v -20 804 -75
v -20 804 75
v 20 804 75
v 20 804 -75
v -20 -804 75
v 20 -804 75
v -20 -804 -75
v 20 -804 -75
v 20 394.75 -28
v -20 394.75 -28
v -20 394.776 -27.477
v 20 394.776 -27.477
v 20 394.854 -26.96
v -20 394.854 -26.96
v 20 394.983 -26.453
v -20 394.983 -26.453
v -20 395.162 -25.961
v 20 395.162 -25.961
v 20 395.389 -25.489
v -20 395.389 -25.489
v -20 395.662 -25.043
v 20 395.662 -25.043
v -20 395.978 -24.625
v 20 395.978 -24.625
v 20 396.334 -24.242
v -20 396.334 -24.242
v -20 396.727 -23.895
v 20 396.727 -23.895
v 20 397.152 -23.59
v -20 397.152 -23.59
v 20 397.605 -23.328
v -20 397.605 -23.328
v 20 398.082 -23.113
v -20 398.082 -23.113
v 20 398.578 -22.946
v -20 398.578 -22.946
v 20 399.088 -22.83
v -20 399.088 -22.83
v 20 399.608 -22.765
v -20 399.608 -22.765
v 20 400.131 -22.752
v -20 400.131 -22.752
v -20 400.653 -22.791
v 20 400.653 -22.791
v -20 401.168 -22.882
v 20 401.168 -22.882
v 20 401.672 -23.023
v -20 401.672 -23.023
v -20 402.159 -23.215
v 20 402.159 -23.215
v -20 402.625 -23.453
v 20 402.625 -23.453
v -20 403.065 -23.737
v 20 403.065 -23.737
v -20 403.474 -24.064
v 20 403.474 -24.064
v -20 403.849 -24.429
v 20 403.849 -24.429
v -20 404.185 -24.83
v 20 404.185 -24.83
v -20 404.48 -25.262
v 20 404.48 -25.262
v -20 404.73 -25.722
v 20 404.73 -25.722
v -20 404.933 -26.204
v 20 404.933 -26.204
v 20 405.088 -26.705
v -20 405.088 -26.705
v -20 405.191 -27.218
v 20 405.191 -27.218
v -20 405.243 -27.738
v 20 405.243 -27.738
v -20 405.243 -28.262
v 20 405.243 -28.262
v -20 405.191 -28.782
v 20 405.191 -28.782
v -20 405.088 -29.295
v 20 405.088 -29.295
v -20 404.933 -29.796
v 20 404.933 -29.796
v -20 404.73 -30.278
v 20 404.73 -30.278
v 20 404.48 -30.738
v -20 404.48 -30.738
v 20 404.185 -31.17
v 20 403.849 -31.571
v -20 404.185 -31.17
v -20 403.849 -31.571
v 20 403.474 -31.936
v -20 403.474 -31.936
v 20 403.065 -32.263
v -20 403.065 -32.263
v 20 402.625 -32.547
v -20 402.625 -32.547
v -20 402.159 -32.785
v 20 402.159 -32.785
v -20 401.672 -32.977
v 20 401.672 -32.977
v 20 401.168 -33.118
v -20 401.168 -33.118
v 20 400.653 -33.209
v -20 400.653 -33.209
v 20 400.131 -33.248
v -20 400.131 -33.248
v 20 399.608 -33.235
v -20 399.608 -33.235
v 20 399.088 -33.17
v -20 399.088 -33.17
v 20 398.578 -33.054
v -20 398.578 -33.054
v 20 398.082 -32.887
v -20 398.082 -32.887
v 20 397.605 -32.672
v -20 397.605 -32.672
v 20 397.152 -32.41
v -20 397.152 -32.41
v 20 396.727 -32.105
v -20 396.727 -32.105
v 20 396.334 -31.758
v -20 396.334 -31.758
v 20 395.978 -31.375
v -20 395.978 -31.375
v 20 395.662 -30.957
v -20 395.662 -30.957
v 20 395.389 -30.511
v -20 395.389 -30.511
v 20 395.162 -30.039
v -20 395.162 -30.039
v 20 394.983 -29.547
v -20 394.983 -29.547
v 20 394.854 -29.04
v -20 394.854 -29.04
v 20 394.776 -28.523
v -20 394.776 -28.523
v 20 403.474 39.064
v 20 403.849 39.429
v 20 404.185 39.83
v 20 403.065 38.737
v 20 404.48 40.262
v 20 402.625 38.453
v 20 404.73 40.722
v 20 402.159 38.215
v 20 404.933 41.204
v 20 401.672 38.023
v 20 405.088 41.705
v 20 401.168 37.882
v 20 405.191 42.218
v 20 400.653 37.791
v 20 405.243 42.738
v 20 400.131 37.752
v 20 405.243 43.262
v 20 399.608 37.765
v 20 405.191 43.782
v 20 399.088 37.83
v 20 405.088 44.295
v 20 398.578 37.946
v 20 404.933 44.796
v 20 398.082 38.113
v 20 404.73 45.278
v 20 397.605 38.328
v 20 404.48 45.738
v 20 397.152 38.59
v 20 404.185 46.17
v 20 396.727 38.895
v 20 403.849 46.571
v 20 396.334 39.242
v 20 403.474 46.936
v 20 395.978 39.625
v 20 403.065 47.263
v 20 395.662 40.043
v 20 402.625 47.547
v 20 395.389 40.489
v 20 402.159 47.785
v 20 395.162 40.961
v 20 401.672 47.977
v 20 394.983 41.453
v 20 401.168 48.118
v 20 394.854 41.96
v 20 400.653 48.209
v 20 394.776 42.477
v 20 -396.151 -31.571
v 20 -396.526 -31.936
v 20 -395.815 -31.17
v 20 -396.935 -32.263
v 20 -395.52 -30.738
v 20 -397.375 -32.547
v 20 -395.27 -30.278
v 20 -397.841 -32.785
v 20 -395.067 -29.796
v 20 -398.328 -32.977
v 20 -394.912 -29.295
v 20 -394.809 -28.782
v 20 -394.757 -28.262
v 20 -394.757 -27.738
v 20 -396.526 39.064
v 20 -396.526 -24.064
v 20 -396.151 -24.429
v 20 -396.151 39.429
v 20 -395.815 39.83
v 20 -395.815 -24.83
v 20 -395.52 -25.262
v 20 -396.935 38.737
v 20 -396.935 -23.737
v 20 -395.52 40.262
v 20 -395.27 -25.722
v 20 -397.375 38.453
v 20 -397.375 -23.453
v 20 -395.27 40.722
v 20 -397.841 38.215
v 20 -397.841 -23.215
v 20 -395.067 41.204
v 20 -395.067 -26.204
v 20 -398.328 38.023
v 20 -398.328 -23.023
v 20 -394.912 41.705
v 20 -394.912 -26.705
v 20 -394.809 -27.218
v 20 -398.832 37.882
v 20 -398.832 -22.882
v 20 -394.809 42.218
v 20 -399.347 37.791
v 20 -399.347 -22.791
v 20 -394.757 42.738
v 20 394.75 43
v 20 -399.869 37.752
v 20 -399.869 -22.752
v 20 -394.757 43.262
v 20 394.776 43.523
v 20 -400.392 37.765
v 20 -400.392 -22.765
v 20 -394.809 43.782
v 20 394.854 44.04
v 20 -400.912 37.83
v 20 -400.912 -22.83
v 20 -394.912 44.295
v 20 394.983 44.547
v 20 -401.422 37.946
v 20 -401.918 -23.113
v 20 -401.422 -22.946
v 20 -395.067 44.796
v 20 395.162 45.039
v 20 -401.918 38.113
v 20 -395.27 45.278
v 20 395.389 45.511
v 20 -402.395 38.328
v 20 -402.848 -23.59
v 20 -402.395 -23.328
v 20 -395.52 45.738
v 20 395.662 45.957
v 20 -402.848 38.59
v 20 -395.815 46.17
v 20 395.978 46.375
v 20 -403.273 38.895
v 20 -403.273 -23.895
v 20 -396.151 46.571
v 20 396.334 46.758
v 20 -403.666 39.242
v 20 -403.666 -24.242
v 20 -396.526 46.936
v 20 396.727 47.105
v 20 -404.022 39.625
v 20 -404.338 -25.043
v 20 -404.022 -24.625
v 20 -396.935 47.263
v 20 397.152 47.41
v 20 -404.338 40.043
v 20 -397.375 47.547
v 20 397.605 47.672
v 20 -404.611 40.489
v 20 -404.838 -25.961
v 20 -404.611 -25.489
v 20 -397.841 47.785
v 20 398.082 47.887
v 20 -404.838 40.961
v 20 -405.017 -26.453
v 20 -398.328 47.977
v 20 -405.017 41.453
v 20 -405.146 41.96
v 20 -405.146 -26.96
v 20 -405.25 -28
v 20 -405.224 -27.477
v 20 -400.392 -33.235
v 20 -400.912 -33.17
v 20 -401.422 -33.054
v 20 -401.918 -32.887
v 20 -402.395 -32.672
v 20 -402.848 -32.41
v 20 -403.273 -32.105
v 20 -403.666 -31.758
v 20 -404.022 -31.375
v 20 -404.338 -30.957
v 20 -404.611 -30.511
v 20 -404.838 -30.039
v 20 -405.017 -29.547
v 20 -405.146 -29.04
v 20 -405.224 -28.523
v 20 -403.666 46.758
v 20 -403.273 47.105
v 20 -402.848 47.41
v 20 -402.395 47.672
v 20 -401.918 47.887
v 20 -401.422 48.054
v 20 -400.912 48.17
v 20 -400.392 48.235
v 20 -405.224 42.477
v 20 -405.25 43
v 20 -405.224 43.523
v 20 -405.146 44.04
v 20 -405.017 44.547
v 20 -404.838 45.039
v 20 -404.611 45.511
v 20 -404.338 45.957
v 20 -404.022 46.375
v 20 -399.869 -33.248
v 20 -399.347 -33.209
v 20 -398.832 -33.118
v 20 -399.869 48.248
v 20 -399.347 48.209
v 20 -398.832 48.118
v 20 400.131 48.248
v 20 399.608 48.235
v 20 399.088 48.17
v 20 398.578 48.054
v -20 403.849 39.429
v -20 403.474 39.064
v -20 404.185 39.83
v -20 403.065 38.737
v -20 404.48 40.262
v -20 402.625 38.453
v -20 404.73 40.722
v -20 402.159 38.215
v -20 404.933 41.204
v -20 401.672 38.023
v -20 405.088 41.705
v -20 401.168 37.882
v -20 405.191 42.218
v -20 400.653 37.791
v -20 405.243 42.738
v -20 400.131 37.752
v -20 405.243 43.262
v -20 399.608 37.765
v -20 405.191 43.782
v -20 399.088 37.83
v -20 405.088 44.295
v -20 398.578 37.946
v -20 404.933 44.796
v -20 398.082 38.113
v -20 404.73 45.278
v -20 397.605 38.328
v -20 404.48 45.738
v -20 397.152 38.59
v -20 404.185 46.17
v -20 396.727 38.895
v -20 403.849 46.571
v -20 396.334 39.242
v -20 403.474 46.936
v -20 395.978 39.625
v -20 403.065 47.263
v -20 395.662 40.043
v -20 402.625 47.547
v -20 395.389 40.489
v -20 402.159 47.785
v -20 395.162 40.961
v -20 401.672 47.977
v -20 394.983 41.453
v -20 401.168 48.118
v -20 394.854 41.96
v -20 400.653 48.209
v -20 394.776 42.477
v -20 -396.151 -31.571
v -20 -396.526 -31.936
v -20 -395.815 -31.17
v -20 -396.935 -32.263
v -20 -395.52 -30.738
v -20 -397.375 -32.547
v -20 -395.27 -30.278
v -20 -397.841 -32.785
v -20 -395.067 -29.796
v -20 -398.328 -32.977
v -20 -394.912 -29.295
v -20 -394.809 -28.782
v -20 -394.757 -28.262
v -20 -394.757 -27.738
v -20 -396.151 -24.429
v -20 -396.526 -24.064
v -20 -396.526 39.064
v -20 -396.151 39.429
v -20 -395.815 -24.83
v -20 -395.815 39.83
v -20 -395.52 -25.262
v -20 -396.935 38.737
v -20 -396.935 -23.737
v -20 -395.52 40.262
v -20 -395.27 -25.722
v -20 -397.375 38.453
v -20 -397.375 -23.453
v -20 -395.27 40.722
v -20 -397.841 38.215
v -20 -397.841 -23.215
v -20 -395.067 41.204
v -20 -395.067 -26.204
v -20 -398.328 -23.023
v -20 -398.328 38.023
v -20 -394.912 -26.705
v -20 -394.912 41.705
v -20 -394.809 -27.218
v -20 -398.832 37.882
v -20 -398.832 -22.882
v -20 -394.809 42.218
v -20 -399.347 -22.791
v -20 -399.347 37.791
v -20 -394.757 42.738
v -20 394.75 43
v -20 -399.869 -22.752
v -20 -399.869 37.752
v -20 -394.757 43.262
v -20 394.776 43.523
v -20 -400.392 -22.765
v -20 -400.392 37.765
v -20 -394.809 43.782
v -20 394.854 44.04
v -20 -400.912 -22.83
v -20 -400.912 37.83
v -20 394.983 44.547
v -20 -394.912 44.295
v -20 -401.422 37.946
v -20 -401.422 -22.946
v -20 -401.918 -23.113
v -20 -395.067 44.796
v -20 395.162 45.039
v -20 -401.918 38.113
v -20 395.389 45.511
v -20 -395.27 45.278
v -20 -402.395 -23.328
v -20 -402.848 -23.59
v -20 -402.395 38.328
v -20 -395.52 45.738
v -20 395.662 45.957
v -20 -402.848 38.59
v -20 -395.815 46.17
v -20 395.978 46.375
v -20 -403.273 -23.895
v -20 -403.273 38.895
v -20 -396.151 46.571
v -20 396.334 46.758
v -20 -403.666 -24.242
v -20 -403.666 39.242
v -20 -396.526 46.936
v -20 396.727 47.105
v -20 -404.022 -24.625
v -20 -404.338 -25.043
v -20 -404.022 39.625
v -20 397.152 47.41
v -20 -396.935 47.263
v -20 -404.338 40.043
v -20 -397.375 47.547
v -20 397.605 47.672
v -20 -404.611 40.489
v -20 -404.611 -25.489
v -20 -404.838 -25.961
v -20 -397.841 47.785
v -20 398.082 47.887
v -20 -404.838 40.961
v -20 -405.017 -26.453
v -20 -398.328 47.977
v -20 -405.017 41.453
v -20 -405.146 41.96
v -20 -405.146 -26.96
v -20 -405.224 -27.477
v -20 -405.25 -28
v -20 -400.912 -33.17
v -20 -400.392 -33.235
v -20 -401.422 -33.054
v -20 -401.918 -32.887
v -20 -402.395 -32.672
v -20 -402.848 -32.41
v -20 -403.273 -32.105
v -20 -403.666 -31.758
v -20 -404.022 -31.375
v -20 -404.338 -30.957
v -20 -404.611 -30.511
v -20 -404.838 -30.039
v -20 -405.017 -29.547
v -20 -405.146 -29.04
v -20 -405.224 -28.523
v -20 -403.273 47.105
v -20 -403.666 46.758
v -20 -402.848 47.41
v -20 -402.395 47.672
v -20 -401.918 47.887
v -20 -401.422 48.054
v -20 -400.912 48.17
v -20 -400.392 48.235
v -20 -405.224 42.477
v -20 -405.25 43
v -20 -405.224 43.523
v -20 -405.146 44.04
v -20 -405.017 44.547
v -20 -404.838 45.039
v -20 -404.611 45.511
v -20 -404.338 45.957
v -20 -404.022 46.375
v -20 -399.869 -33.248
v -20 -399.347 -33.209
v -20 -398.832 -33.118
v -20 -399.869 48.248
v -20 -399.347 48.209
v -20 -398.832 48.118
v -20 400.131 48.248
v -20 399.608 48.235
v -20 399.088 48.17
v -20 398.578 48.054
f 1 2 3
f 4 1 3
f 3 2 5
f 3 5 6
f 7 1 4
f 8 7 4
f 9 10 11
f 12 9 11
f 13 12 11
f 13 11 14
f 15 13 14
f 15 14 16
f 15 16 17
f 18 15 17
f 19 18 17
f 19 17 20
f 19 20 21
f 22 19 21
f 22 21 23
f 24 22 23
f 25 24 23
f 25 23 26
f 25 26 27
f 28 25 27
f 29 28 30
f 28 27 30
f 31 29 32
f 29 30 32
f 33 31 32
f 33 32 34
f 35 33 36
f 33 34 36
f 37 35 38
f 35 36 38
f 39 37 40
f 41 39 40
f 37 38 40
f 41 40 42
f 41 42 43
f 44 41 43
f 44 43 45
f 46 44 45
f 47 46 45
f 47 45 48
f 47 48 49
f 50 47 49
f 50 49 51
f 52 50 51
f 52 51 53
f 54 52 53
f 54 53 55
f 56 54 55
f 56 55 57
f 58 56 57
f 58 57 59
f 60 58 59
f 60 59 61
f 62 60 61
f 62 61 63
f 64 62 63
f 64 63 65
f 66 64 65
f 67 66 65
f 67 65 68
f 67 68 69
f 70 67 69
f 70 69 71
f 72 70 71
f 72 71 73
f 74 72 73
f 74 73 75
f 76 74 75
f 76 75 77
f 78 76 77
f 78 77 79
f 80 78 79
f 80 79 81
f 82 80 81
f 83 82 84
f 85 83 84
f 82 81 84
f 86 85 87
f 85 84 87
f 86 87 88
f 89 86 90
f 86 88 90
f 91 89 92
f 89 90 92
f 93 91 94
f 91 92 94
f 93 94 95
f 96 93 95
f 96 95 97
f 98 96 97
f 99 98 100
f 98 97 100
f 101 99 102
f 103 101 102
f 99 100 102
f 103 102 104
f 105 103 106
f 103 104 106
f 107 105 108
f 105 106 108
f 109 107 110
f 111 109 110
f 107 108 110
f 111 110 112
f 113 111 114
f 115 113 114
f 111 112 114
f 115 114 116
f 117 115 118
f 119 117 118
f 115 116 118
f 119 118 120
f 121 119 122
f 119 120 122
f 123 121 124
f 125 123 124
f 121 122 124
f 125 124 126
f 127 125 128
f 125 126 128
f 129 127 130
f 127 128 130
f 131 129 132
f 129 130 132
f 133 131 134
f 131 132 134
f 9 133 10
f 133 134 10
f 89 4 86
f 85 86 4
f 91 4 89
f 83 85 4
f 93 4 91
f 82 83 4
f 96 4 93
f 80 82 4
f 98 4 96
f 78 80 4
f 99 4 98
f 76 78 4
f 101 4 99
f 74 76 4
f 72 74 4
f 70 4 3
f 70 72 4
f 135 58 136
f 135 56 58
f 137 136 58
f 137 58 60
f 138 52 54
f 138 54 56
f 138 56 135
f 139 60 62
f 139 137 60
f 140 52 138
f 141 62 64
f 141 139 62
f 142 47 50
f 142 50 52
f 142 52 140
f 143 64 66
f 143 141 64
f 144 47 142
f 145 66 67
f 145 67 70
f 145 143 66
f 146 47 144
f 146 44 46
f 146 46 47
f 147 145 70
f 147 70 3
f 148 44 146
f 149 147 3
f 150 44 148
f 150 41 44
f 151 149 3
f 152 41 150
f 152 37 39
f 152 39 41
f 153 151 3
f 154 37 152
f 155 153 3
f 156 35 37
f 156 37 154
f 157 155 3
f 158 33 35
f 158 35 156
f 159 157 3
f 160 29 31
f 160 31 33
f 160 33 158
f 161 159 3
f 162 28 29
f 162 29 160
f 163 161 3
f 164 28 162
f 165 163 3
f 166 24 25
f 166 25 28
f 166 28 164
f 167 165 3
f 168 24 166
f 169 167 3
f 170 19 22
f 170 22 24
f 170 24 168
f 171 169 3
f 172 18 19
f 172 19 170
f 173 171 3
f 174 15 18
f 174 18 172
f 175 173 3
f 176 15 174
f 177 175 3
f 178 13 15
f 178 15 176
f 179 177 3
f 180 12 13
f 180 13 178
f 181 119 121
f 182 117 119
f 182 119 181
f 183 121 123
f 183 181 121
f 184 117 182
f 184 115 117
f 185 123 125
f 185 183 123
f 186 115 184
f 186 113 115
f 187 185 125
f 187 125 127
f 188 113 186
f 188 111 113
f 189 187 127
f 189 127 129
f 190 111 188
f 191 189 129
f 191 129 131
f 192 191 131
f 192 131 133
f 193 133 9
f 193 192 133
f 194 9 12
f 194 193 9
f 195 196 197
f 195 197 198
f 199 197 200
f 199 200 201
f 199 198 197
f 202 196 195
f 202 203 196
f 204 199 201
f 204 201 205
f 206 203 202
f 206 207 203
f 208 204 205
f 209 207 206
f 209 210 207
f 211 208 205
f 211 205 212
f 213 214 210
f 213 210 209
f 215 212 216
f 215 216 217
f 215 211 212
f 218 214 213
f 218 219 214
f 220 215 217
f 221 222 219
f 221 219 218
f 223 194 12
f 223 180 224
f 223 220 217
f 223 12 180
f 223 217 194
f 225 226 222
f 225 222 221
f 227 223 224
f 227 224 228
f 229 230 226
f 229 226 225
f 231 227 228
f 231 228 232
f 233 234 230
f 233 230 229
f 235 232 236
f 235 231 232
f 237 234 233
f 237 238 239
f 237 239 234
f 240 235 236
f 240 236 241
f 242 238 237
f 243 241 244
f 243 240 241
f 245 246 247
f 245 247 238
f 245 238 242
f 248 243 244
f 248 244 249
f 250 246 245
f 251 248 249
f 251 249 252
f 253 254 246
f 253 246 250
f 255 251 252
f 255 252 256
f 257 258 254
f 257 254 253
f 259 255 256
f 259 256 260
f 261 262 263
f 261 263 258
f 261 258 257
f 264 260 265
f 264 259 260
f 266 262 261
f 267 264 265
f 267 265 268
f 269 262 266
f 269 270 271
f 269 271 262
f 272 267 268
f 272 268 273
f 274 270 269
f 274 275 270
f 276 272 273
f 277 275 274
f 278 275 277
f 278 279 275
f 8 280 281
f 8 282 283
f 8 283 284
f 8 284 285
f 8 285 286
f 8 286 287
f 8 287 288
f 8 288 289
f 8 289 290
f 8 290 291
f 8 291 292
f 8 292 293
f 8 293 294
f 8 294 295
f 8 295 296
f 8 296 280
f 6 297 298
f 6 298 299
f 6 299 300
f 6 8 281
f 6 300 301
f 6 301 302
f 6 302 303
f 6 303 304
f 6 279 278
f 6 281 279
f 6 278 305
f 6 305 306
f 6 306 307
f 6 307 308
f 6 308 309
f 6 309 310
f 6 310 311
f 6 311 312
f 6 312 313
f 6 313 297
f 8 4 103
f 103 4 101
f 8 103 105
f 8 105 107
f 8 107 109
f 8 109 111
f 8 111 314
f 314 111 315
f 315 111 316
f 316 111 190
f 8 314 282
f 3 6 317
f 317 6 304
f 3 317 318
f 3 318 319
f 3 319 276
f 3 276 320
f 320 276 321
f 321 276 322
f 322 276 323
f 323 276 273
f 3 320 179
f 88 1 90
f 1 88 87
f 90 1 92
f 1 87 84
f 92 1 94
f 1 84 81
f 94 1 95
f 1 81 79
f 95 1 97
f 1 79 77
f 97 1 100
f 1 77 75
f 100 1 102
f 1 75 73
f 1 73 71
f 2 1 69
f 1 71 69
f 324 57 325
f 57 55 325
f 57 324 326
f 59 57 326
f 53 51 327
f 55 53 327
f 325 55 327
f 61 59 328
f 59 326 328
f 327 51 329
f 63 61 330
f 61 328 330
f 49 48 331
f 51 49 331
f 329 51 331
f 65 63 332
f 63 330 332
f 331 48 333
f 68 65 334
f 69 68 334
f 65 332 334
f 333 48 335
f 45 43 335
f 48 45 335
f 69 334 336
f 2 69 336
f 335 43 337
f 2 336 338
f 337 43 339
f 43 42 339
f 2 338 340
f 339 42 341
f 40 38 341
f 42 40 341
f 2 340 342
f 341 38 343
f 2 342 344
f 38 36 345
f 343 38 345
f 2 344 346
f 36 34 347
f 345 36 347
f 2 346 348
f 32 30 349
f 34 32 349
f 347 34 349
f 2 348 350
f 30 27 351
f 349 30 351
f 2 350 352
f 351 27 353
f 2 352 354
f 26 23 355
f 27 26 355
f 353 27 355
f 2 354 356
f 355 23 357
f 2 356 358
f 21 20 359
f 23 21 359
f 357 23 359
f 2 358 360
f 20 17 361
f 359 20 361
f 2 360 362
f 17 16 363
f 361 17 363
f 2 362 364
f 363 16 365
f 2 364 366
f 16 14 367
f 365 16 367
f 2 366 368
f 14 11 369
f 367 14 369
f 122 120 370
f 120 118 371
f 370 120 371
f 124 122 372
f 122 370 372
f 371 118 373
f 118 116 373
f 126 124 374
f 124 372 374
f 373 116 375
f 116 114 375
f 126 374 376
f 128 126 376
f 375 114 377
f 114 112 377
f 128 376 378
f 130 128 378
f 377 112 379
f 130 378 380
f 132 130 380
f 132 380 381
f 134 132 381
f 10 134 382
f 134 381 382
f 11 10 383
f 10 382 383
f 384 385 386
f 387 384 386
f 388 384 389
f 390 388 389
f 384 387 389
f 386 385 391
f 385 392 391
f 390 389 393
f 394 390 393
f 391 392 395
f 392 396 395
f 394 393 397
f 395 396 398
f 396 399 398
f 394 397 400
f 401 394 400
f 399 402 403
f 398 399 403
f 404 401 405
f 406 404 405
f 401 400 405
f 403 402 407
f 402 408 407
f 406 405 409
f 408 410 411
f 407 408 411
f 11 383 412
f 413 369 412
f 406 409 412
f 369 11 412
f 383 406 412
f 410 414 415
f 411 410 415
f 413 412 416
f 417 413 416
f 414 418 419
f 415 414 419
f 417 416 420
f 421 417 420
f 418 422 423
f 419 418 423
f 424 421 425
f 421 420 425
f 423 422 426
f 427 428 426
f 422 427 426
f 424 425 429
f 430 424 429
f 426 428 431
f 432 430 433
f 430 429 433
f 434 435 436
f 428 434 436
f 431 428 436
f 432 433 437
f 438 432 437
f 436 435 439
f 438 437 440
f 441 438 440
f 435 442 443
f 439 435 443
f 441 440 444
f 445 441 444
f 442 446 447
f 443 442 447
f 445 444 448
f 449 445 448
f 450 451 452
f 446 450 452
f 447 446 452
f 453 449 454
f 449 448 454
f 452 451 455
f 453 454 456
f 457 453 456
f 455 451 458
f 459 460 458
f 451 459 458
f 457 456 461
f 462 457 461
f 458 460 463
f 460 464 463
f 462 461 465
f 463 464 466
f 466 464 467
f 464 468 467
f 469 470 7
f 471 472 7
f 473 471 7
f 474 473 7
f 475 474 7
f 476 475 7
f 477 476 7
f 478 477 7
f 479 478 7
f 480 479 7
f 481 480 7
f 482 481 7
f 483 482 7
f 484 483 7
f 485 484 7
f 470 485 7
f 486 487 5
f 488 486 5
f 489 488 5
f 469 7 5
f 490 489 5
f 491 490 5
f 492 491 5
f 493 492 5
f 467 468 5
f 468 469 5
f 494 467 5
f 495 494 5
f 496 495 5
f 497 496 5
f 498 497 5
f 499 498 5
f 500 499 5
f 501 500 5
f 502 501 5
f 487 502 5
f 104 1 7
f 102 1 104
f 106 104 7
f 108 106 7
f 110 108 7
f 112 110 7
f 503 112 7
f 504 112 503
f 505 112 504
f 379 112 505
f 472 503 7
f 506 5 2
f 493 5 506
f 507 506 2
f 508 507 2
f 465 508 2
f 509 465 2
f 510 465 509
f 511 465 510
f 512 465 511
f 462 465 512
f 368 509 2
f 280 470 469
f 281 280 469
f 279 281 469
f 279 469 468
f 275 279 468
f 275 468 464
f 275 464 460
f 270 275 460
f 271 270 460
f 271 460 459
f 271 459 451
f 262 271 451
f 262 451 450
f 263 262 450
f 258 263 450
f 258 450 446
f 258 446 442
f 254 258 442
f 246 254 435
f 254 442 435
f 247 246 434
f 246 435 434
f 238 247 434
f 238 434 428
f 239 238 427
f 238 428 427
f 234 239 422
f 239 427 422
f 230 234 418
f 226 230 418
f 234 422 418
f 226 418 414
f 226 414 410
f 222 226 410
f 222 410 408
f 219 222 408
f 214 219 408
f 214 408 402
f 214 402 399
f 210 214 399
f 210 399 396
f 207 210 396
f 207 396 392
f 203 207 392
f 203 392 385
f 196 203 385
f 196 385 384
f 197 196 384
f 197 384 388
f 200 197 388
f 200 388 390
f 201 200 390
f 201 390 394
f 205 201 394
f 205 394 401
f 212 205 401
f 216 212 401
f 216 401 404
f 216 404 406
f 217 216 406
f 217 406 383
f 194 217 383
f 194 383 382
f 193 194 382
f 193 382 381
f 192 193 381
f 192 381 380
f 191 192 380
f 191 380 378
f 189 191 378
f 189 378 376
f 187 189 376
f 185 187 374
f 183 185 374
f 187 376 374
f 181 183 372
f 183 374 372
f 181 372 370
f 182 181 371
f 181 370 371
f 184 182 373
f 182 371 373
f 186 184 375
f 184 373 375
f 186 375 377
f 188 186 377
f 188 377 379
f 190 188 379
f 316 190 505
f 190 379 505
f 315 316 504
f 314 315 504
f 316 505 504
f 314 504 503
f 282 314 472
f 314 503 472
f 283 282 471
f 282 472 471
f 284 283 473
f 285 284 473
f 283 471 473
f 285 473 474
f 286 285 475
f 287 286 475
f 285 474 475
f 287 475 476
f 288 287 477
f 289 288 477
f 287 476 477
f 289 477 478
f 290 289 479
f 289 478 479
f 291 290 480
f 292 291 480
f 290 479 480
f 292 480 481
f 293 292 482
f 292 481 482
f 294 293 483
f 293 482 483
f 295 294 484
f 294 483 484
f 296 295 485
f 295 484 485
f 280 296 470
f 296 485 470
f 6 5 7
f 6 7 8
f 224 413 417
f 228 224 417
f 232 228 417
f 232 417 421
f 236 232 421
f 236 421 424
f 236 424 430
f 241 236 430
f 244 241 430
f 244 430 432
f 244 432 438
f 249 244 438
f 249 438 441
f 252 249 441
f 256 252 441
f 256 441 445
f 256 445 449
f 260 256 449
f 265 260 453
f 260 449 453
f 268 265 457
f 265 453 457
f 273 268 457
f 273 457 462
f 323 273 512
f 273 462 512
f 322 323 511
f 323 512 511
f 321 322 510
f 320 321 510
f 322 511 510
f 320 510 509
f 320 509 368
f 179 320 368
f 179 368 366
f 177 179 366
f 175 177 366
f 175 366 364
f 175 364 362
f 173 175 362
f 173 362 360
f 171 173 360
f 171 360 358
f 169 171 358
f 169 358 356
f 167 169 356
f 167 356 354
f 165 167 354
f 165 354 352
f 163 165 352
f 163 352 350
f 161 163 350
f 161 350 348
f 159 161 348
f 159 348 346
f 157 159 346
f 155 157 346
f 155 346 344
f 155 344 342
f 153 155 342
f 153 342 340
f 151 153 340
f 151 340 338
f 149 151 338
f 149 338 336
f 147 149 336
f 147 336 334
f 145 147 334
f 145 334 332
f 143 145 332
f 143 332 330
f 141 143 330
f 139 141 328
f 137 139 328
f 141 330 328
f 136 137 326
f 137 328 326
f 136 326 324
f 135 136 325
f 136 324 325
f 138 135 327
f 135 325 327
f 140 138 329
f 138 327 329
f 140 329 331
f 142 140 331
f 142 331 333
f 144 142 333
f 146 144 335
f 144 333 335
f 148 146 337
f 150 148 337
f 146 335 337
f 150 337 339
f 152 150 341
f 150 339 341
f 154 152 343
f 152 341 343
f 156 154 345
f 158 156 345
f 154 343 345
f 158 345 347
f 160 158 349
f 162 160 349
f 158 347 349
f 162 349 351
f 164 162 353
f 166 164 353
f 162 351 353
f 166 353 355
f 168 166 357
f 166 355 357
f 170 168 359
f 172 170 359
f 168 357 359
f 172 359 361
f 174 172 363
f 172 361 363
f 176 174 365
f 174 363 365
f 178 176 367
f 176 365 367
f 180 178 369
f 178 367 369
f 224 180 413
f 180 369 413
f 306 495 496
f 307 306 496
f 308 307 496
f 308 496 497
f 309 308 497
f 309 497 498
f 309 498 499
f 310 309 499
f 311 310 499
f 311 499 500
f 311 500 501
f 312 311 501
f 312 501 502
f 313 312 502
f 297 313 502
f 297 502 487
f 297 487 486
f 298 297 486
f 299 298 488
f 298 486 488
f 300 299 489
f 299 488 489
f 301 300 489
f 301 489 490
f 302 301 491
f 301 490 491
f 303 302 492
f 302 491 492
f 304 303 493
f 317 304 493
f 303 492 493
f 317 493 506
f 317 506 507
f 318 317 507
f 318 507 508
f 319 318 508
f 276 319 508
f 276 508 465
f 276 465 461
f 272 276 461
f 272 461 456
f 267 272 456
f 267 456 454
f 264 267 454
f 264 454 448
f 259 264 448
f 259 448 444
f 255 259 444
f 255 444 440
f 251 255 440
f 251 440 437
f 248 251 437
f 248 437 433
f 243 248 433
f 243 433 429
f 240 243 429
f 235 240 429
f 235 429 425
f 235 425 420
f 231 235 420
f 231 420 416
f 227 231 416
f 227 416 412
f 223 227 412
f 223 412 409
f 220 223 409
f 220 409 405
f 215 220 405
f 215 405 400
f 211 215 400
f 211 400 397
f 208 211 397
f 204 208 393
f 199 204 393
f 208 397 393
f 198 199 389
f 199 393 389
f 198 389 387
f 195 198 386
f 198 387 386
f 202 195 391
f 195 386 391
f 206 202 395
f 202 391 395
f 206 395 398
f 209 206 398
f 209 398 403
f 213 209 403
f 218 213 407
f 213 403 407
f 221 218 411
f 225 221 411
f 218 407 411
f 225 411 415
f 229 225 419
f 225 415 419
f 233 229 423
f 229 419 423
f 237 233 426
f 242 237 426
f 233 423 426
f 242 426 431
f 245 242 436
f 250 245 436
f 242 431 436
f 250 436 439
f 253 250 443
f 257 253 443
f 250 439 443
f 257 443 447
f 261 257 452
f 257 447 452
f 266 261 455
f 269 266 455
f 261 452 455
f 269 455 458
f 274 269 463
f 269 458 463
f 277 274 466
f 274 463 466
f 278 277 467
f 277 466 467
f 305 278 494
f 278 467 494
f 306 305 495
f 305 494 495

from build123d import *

# Parameters (mm, degrees)
F0_W     = 40
F0_H     = 150
F1_DEPTH = 804
F3_D     = 10.5


with BuildPart() as f1:
    # F0 (on Front) → F1 (new body, symmetric)
    with BuildSketch(Plane.XZ):
        Rectangle(F0_W, F0_H)
    extrude(amount=F1_DEPTH, both=True)

    # F3 (through all)
    with Locations(Plane.YZ.offset(20)):
        with Locations((-400, 43), (-400, -28), (400, -28), (400, 43)):
            Hole(F3_D / 2)


solid = f1.part
